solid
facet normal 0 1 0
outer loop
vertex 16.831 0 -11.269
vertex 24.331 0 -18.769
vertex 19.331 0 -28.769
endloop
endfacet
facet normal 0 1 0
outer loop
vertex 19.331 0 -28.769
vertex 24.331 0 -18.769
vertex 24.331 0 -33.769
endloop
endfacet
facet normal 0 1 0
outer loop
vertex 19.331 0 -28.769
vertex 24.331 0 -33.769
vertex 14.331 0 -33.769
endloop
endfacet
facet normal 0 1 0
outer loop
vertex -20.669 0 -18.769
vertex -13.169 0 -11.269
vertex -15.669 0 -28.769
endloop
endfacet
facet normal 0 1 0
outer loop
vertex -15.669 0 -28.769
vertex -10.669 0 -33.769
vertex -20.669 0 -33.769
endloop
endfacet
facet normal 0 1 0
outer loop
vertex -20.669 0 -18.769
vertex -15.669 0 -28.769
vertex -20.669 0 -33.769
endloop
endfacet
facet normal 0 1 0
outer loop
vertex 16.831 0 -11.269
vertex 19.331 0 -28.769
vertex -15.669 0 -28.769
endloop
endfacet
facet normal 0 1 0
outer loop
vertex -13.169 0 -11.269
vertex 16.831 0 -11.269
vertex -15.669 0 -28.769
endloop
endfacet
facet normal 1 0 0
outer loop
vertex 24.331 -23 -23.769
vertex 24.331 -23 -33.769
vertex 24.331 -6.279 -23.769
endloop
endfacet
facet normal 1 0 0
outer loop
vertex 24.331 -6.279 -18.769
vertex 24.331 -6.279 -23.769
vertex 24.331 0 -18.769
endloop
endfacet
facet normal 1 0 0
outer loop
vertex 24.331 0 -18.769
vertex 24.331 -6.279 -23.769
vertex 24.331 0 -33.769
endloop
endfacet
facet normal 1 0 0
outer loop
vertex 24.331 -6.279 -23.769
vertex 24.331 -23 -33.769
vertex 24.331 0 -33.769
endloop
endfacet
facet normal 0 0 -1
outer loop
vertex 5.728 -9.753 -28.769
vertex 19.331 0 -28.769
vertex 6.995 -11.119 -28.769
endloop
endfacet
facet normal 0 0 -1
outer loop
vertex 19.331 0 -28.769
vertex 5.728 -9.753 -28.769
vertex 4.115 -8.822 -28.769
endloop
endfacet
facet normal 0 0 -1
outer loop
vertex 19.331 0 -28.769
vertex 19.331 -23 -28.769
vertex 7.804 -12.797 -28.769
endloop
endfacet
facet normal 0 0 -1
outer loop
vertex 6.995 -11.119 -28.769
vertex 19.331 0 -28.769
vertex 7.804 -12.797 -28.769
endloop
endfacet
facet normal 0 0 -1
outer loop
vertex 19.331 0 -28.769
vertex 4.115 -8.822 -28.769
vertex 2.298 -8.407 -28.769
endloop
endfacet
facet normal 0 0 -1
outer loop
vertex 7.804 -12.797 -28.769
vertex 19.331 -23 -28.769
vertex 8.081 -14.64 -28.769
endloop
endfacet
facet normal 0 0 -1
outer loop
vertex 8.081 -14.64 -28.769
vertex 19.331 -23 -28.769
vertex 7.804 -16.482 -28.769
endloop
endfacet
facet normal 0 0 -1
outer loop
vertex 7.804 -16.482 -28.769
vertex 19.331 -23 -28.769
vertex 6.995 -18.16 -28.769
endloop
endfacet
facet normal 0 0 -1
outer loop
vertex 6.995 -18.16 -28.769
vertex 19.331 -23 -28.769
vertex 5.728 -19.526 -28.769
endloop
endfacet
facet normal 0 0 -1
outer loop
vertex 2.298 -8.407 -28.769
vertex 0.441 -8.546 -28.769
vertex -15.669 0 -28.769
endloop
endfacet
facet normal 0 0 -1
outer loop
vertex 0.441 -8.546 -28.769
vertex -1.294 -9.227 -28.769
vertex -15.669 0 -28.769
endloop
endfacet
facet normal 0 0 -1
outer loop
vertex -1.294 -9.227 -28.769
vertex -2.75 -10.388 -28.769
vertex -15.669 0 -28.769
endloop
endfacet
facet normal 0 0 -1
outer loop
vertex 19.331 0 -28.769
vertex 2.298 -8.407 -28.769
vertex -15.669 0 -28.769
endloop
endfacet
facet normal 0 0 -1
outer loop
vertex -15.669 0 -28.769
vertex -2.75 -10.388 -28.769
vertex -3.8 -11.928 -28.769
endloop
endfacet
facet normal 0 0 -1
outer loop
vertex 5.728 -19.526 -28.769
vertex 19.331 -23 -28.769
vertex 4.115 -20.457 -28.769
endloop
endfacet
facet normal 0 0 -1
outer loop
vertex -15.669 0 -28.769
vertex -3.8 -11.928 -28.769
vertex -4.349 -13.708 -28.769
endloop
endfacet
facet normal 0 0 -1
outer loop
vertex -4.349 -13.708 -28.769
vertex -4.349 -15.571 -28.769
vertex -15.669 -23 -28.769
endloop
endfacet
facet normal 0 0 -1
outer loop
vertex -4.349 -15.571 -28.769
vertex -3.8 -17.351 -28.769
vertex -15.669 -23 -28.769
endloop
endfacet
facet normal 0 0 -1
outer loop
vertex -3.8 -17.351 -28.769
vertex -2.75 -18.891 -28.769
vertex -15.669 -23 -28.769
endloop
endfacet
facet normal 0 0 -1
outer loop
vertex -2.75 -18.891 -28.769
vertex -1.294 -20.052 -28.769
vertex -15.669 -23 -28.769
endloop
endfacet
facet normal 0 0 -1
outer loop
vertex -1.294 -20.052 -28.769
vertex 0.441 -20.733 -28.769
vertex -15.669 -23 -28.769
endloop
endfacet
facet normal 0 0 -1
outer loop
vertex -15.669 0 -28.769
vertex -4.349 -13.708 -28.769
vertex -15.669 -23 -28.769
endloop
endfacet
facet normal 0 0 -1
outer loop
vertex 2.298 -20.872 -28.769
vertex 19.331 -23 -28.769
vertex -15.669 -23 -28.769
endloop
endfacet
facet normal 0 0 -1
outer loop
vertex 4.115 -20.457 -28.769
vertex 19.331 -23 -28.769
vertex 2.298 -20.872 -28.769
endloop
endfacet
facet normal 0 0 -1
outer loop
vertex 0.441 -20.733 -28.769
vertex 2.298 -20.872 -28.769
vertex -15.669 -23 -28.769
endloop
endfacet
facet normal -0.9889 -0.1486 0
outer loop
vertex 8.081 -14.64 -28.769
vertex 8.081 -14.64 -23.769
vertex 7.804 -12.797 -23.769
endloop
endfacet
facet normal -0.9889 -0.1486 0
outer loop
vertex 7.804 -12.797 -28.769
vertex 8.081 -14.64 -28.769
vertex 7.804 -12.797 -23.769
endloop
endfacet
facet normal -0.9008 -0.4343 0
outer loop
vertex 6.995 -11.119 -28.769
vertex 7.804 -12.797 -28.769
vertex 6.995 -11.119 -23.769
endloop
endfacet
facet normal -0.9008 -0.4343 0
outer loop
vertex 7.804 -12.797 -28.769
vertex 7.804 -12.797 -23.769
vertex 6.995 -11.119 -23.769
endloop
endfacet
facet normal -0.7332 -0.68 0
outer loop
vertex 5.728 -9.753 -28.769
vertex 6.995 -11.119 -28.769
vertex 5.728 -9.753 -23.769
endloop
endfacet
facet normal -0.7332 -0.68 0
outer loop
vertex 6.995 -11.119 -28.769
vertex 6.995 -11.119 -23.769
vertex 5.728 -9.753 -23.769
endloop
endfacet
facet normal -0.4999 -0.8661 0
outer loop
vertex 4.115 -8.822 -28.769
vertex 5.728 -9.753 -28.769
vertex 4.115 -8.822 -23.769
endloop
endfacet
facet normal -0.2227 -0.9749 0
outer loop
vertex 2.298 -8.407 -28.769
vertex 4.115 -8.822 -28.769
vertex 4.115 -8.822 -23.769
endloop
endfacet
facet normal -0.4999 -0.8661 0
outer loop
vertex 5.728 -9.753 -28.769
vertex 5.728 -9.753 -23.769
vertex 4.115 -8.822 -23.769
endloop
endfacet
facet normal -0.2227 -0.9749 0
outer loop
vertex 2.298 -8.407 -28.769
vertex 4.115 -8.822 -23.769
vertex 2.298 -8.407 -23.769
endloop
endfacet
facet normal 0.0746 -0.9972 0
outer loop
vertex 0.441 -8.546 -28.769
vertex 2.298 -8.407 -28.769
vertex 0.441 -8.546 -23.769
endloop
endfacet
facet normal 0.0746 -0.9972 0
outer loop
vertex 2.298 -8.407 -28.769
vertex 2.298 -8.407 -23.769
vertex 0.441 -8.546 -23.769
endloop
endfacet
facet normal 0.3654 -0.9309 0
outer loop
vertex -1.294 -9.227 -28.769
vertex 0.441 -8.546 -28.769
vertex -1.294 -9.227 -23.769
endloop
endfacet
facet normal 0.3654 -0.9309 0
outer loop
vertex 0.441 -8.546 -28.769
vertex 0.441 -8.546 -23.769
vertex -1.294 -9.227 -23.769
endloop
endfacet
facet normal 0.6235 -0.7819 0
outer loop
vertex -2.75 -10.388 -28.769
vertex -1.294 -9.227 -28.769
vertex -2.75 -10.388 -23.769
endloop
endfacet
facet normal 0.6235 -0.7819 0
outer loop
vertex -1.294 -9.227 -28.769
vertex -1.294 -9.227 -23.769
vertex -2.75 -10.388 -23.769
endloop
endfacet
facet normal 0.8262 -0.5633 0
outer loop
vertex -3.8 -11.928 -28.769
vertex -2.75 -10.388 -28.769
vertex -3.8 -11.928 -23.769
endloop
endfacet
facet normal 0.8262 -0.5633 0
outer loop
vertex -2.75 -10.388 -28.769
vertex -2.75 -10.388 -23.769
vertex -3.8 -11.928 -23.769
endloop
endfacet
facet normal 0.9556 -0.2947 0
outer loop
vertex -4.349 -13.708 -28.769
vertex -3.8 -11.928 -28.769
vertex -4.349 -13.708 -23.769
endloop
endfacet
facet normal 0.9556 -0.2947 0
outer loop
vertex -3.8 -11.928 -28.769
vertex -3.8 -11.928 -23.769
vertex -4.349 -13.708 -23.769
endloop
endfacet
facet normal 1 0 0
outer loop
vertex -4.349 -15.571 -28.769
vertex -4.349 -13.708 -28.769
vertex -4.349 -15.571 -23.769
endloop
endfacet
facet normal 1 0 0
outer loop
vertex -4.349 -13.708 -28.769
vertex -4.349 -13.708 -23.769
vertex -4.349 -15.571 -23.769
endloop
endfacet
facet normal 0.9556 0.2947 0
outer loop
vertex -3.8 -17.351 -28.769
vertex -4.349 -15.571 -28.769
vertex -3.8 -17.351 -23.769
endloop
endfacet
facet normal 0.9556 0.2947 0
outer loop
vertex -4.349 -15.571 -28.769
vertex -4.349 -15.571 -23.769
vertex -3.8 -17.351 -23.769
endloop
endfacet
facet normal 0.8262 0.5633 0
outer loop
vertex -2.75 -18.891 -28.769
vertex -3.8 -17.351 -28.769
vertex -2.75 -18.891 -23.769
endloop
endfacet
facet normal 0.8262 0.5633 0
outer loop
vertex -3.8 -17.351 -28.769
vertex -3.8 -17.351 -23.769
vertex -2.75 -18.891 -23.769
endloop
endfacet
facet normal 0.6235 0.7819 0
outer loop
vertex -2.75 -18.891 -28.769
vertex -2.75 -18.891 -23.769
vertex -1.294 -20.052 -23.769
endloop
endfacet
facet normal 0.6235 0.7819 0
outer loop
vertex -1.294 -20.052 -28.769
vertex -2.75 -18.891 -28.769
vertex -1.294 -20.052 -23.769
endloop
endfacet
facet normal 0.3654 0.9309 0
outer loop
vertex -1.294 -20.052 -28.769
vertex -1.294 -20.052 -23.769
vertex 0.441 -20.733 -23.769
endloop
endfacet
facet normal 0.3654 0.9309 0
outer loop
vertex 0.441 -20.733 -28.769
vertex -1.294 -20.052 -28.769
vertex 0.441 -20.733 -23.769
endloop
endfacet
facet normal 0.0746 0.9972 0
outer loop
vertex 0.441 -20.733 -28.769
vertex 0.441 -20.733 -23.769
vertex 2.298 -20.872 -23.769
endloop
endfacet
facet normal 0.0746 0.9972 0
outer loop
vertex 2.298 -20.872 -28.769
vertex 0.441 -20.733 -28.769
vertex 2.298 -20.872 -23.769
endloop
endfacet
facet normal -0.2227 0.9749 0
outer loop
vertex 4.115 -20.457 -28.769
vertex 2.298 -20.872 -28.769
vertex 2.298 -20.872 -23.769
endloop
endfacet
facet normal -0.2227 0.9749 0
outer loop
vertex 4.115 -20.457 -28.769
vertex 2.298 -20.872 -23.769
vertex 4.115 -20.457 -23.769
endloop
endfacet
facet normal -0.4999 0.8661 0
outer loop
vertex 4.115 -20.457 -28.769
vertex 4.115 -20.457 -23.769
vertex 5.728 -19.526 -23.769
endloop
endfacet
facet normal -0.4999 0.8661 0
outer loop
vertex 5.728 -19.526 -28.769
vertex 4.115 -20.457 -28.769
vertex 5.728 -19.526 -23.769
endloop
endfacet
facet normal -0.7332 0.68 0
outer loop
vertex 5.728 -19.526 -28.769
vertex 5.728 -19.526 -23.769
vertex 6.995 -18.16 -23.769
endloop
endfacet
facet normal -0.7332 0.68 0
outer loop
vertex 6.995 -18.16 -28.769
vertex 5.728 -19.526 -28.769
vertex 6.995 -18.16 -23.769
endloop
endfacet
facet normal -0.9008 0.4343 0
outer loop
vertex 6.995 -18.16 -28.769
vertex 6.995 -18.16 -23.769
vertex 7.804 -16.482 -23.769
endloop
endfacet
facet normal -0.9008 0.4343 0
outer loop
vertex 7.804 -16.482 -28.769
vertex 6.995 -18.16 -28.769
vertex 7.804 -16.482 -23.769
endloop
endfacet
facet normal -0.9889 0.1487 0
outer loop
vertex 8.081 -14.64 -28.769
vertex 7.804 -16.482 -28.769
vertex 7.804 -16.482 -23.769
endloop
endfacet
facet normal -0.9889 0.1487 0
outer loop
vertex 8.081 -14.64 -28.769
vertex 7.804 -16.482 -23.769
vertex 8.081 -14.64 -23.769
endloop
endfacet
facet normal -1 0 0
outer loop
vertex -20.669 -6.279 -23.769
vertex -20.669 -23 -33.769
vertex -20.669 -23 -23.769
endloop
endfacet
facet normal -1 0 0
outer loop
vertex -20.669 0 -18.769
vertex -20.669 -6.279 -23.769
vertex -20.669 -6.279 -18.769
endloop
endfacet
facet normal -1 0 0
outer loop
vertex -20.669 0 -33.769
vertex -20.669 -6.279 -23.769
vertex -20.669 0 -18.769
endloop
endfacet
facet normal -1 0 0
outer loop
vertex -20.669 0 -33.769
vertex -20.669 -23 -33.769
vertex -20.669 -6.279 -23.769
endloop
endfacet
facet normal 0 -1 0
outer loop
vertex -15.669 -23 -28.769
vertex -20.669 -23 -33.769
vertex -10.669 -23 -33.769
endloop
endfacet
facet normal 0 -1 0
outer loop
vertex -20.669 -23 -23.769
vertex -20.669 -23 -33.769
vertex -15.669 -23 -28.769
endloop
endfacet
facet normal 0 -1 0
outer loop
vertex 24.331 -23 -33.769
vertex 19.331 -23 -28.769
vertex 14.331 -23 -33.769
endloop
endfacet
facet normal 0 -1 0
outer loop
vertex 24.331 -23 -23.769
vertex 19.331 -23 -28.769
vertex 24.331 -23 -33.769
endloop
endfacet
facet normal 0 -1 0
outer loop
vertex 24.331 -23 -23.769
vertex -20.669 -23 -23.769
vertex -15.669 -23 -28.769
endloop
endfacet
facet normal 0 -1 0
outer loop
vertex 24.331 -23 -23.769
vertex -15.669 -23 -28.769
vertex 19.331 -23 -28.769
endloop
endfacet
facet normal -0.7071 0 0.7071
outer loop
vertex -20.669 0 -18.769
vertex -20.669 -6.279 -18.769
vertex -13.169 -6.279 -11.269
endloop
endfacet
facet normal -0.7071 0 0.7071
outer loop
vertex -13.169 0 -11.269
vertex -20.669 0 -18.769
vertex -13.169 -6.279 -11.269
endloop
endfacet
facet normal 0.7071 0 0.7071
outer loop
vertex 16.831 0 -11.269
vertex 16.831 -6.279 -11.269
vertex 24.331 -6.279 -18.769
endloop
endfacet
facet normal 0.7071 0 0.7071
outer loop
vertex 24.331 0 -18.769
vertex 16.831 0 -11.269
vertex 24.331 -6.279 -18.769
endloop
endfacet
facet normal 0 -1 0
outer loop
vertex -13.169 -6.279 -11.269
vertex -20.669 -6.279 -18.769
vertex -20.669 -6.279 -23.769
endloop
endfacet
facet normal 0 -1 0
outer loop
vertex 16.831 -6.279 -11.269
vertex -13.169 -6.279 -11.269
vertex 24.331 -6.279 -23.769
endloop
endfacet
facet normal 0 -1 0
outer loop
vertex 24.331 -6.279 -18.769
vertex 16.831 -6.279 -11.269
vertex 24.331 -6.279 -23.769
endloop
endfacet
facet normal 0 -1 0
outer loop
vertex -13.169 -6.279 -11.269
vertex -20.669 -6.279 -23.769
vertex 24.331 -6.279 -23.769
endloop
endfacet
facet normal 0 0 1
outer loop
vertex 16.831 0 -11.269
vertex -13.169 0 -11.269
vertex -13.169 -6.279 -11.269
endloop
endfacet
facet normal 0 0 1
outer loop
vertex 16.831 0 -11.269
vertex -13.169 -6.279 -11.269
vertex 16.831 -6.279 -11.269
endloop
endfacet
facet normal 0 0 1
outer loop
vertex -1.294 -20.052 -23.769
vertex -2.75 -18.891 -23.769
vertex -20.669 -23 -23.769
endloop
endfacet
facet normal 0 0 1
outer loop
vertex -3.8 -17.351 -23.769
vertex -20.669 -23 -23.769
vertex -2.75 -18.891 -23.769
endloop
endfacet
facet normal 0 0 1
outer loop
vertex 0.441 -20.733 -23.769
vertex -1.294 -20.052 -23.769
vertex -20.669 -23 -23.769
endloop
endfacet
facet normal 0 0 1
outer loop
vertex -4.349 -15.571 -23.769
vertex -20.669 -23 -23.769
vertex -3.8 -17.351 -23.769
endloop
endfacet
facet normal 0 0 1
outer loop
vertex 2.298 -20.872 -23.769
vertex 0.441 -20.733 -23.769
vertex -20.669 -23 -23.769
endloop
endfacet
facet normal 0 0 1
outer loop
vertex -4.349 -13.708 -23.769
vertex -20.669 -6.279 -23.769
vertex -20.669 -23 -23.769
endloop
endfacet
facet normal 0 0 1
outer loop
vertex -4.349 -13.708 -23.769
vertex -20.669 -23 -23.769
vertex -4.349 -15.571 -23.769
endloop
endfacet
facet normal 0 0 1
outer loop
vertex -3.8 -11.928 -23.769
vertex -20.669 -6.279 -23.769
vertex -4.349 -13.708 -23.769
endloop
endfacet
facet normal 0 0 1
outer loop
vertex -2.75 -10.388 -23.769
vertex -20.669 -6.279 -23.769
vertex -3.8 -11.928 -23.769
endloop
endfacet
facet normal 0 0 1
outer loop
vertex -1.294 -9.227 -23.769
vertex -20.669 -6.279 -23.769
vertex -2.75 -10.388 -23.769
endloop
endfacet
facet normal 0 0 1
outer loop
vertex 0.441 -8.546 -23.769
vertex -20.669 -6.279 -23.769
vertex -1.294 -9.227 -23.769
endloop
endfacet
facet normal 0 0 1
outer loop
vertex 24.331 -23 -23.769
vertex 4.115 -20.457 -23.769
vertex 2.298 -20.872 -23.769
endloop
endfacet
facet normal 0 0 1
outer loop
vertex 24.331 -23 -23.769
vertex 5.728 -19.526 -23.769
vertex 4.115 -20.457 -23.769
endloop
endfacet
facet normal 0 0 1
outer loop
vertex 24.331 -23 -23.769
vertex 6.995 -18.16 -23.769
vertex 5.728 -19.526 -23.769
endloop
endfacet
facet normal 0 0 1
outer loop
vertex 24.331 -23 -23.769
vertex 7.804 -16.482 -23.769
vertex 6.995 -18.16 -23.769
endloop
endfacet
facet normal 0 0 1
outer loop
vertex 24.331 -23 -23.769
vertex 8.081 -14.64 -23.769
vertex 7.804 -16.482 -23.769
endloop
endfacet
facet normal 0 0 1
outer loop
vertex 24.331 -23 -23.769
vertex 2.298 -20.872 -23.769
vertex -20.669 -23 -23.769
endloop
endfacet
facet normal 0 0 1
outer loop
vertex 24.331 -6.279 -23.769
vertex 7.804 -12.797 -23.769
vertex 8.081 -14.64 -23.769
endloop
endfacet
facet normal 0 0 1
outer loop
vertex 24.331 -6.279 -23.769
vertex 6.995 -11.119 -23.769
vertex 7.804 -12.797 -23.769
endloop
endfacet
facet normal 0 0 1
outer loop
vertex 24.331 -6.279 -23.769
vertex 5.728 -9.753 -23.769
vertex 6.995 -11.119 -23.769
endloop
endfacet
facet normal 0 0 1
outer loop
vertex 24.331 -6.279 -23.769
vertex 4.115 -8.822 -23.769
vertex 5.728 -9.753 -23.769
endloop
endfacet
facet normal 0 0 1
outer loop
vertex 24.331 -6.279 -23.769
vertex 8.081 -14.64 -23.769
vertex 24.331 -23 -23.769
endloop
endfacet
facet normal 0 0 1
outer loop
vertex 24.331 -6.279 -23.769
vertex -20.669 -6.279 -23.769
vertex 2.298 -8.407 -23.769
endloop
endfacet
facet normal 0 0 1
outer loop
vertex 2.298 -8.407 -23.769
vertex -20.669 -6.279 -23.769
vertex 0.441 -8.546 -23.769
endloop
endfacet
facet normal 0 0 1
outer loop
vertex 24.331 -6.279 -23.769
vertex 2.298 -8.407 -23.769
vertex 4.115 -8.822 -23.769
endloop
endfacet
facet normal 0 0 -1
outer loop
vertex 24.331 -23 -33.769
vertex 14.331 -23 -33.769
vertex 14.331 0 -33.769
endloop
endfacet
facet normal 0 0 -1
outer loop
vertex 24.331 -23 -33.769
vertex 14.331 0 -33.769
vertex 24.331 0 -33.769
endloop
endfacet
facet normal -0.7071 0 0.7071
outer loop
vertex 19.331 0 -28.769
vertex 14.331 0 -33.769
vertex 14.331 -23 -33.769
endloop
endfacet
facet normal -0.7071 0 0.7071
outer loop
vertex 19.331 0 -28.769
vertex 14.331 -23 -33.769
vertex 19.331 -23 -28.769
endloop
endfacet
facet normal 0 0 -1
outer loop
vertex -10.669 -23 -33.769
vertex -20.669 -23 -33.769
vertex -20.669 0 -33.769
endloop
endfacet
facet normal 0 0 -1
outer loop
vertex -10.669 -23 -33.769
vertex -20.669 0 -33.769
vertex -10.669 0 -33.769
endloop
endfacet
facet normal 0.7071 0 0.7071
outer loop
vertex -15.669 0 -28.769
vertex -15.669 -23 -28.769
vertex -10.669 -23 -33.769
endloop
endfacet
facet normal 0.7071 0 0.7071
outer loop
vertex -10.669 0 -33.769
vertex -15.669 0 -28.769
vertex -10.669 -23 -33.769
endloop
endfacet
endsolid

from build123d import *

# Parameters (mm, degrees)
F0_W      = 45
F0_H      = 10
F1_DEPTH  = 23
F2_W      = 30
F2_H      = 6.27907
F2_W_2    = 7.5
F3_DEPTH  = 12.5
F5_DEPTH  = 6.28007
F7_DEPTH  = 6.28007
F8_W      = 25
F8_H      = 23
F9_DEPTH  = 5
F11_DEPTH = 23.001
F12_R     = 6.25
F13_DEPTH = 10.001


with BuildPart() as f1:
    # F0 (on Front) → F1 (new body)
    with BuildSketch(Plane.XZ):
        with Locations((1.831396, -28.768687)):
            Rectangle(F0_W, F0_H)
    extrude(amount=F1_DEPTH)

    # F2 (on face) → F3 (join)
    with BuildSketch(Plane.XY.offset(-23.768687)):
        with Locations((1.831396, -3.139535)):
            Rectangle(F2_W, F2_H)
        with Locations((20.581396, -3.139535)):
            Rectangle(F2_W_2, F2_H)
        with Locations((-16.918604, -3.139535)):
            Rectangle(F2_W_2, F2_H)
    extrude(amount=F3_DEPTH)

    # F4 (on face) → F5 (cut, through all)
    with BuildSketch(Plane.XZ.offset(6.27907)):
        Polygon((16.831396, -11.268687), (24.331396, -18.768687), (24.331396, -11.268687), align=None)
    extrude(amount=-F5_DEPTH, mode=Mode.SUBTRACT)

    # F6 (on face) → F7 (cut, through all)
    with BuildSketch(Plane.XZ.offset(6.27907)):
        Polygon((-20.668604, -11.268687), (-20.668604, -18.768687), (-13.168604, -11.268687), align=None)
    extrude(amount=-F7_DEPTH, mode=Mode.SUBTRACT)

    # F8 (on face) → F9 (cut)
    with BuildSketch(Plane(origin=(0, 0, -33.768687), x_dir=(1, 0, 0), z_dir=(0, 0, -1))):
        with Locations((1.831396, 11.5)):
            Rectangle(F8_W, F8_H)
    extrude(amount=-F9_DEPTH, mode=Mode.SUBTRACT)

    # F10 (on face) → F11 (cut, through all)
    with BuildSketch(Plane.XZ.offset(23)):
        Polygon((-10.668604, -33.768687), (-10.668604, -28.768687), (-15.668604, -28.768687), align=None)
        Polygon((19.331396, -28.768687), (14.331396, -28.768687), (14.331396, -33.768687), align=None)
    extrude(amount=-F11_DEPTH, mode=Mode.SUBTRACT)

    # F12 (on face) → F13 (cut, through all)
    with BuildSketch(Plane.XY.offset(-23.768687)):
        with Locations((1.831396, -14.639535)):
            Circle(F12_R)
    extrude(amount=-F13_DEPTH, mode=Mode.SUBTRACT)


solid = f1.part
